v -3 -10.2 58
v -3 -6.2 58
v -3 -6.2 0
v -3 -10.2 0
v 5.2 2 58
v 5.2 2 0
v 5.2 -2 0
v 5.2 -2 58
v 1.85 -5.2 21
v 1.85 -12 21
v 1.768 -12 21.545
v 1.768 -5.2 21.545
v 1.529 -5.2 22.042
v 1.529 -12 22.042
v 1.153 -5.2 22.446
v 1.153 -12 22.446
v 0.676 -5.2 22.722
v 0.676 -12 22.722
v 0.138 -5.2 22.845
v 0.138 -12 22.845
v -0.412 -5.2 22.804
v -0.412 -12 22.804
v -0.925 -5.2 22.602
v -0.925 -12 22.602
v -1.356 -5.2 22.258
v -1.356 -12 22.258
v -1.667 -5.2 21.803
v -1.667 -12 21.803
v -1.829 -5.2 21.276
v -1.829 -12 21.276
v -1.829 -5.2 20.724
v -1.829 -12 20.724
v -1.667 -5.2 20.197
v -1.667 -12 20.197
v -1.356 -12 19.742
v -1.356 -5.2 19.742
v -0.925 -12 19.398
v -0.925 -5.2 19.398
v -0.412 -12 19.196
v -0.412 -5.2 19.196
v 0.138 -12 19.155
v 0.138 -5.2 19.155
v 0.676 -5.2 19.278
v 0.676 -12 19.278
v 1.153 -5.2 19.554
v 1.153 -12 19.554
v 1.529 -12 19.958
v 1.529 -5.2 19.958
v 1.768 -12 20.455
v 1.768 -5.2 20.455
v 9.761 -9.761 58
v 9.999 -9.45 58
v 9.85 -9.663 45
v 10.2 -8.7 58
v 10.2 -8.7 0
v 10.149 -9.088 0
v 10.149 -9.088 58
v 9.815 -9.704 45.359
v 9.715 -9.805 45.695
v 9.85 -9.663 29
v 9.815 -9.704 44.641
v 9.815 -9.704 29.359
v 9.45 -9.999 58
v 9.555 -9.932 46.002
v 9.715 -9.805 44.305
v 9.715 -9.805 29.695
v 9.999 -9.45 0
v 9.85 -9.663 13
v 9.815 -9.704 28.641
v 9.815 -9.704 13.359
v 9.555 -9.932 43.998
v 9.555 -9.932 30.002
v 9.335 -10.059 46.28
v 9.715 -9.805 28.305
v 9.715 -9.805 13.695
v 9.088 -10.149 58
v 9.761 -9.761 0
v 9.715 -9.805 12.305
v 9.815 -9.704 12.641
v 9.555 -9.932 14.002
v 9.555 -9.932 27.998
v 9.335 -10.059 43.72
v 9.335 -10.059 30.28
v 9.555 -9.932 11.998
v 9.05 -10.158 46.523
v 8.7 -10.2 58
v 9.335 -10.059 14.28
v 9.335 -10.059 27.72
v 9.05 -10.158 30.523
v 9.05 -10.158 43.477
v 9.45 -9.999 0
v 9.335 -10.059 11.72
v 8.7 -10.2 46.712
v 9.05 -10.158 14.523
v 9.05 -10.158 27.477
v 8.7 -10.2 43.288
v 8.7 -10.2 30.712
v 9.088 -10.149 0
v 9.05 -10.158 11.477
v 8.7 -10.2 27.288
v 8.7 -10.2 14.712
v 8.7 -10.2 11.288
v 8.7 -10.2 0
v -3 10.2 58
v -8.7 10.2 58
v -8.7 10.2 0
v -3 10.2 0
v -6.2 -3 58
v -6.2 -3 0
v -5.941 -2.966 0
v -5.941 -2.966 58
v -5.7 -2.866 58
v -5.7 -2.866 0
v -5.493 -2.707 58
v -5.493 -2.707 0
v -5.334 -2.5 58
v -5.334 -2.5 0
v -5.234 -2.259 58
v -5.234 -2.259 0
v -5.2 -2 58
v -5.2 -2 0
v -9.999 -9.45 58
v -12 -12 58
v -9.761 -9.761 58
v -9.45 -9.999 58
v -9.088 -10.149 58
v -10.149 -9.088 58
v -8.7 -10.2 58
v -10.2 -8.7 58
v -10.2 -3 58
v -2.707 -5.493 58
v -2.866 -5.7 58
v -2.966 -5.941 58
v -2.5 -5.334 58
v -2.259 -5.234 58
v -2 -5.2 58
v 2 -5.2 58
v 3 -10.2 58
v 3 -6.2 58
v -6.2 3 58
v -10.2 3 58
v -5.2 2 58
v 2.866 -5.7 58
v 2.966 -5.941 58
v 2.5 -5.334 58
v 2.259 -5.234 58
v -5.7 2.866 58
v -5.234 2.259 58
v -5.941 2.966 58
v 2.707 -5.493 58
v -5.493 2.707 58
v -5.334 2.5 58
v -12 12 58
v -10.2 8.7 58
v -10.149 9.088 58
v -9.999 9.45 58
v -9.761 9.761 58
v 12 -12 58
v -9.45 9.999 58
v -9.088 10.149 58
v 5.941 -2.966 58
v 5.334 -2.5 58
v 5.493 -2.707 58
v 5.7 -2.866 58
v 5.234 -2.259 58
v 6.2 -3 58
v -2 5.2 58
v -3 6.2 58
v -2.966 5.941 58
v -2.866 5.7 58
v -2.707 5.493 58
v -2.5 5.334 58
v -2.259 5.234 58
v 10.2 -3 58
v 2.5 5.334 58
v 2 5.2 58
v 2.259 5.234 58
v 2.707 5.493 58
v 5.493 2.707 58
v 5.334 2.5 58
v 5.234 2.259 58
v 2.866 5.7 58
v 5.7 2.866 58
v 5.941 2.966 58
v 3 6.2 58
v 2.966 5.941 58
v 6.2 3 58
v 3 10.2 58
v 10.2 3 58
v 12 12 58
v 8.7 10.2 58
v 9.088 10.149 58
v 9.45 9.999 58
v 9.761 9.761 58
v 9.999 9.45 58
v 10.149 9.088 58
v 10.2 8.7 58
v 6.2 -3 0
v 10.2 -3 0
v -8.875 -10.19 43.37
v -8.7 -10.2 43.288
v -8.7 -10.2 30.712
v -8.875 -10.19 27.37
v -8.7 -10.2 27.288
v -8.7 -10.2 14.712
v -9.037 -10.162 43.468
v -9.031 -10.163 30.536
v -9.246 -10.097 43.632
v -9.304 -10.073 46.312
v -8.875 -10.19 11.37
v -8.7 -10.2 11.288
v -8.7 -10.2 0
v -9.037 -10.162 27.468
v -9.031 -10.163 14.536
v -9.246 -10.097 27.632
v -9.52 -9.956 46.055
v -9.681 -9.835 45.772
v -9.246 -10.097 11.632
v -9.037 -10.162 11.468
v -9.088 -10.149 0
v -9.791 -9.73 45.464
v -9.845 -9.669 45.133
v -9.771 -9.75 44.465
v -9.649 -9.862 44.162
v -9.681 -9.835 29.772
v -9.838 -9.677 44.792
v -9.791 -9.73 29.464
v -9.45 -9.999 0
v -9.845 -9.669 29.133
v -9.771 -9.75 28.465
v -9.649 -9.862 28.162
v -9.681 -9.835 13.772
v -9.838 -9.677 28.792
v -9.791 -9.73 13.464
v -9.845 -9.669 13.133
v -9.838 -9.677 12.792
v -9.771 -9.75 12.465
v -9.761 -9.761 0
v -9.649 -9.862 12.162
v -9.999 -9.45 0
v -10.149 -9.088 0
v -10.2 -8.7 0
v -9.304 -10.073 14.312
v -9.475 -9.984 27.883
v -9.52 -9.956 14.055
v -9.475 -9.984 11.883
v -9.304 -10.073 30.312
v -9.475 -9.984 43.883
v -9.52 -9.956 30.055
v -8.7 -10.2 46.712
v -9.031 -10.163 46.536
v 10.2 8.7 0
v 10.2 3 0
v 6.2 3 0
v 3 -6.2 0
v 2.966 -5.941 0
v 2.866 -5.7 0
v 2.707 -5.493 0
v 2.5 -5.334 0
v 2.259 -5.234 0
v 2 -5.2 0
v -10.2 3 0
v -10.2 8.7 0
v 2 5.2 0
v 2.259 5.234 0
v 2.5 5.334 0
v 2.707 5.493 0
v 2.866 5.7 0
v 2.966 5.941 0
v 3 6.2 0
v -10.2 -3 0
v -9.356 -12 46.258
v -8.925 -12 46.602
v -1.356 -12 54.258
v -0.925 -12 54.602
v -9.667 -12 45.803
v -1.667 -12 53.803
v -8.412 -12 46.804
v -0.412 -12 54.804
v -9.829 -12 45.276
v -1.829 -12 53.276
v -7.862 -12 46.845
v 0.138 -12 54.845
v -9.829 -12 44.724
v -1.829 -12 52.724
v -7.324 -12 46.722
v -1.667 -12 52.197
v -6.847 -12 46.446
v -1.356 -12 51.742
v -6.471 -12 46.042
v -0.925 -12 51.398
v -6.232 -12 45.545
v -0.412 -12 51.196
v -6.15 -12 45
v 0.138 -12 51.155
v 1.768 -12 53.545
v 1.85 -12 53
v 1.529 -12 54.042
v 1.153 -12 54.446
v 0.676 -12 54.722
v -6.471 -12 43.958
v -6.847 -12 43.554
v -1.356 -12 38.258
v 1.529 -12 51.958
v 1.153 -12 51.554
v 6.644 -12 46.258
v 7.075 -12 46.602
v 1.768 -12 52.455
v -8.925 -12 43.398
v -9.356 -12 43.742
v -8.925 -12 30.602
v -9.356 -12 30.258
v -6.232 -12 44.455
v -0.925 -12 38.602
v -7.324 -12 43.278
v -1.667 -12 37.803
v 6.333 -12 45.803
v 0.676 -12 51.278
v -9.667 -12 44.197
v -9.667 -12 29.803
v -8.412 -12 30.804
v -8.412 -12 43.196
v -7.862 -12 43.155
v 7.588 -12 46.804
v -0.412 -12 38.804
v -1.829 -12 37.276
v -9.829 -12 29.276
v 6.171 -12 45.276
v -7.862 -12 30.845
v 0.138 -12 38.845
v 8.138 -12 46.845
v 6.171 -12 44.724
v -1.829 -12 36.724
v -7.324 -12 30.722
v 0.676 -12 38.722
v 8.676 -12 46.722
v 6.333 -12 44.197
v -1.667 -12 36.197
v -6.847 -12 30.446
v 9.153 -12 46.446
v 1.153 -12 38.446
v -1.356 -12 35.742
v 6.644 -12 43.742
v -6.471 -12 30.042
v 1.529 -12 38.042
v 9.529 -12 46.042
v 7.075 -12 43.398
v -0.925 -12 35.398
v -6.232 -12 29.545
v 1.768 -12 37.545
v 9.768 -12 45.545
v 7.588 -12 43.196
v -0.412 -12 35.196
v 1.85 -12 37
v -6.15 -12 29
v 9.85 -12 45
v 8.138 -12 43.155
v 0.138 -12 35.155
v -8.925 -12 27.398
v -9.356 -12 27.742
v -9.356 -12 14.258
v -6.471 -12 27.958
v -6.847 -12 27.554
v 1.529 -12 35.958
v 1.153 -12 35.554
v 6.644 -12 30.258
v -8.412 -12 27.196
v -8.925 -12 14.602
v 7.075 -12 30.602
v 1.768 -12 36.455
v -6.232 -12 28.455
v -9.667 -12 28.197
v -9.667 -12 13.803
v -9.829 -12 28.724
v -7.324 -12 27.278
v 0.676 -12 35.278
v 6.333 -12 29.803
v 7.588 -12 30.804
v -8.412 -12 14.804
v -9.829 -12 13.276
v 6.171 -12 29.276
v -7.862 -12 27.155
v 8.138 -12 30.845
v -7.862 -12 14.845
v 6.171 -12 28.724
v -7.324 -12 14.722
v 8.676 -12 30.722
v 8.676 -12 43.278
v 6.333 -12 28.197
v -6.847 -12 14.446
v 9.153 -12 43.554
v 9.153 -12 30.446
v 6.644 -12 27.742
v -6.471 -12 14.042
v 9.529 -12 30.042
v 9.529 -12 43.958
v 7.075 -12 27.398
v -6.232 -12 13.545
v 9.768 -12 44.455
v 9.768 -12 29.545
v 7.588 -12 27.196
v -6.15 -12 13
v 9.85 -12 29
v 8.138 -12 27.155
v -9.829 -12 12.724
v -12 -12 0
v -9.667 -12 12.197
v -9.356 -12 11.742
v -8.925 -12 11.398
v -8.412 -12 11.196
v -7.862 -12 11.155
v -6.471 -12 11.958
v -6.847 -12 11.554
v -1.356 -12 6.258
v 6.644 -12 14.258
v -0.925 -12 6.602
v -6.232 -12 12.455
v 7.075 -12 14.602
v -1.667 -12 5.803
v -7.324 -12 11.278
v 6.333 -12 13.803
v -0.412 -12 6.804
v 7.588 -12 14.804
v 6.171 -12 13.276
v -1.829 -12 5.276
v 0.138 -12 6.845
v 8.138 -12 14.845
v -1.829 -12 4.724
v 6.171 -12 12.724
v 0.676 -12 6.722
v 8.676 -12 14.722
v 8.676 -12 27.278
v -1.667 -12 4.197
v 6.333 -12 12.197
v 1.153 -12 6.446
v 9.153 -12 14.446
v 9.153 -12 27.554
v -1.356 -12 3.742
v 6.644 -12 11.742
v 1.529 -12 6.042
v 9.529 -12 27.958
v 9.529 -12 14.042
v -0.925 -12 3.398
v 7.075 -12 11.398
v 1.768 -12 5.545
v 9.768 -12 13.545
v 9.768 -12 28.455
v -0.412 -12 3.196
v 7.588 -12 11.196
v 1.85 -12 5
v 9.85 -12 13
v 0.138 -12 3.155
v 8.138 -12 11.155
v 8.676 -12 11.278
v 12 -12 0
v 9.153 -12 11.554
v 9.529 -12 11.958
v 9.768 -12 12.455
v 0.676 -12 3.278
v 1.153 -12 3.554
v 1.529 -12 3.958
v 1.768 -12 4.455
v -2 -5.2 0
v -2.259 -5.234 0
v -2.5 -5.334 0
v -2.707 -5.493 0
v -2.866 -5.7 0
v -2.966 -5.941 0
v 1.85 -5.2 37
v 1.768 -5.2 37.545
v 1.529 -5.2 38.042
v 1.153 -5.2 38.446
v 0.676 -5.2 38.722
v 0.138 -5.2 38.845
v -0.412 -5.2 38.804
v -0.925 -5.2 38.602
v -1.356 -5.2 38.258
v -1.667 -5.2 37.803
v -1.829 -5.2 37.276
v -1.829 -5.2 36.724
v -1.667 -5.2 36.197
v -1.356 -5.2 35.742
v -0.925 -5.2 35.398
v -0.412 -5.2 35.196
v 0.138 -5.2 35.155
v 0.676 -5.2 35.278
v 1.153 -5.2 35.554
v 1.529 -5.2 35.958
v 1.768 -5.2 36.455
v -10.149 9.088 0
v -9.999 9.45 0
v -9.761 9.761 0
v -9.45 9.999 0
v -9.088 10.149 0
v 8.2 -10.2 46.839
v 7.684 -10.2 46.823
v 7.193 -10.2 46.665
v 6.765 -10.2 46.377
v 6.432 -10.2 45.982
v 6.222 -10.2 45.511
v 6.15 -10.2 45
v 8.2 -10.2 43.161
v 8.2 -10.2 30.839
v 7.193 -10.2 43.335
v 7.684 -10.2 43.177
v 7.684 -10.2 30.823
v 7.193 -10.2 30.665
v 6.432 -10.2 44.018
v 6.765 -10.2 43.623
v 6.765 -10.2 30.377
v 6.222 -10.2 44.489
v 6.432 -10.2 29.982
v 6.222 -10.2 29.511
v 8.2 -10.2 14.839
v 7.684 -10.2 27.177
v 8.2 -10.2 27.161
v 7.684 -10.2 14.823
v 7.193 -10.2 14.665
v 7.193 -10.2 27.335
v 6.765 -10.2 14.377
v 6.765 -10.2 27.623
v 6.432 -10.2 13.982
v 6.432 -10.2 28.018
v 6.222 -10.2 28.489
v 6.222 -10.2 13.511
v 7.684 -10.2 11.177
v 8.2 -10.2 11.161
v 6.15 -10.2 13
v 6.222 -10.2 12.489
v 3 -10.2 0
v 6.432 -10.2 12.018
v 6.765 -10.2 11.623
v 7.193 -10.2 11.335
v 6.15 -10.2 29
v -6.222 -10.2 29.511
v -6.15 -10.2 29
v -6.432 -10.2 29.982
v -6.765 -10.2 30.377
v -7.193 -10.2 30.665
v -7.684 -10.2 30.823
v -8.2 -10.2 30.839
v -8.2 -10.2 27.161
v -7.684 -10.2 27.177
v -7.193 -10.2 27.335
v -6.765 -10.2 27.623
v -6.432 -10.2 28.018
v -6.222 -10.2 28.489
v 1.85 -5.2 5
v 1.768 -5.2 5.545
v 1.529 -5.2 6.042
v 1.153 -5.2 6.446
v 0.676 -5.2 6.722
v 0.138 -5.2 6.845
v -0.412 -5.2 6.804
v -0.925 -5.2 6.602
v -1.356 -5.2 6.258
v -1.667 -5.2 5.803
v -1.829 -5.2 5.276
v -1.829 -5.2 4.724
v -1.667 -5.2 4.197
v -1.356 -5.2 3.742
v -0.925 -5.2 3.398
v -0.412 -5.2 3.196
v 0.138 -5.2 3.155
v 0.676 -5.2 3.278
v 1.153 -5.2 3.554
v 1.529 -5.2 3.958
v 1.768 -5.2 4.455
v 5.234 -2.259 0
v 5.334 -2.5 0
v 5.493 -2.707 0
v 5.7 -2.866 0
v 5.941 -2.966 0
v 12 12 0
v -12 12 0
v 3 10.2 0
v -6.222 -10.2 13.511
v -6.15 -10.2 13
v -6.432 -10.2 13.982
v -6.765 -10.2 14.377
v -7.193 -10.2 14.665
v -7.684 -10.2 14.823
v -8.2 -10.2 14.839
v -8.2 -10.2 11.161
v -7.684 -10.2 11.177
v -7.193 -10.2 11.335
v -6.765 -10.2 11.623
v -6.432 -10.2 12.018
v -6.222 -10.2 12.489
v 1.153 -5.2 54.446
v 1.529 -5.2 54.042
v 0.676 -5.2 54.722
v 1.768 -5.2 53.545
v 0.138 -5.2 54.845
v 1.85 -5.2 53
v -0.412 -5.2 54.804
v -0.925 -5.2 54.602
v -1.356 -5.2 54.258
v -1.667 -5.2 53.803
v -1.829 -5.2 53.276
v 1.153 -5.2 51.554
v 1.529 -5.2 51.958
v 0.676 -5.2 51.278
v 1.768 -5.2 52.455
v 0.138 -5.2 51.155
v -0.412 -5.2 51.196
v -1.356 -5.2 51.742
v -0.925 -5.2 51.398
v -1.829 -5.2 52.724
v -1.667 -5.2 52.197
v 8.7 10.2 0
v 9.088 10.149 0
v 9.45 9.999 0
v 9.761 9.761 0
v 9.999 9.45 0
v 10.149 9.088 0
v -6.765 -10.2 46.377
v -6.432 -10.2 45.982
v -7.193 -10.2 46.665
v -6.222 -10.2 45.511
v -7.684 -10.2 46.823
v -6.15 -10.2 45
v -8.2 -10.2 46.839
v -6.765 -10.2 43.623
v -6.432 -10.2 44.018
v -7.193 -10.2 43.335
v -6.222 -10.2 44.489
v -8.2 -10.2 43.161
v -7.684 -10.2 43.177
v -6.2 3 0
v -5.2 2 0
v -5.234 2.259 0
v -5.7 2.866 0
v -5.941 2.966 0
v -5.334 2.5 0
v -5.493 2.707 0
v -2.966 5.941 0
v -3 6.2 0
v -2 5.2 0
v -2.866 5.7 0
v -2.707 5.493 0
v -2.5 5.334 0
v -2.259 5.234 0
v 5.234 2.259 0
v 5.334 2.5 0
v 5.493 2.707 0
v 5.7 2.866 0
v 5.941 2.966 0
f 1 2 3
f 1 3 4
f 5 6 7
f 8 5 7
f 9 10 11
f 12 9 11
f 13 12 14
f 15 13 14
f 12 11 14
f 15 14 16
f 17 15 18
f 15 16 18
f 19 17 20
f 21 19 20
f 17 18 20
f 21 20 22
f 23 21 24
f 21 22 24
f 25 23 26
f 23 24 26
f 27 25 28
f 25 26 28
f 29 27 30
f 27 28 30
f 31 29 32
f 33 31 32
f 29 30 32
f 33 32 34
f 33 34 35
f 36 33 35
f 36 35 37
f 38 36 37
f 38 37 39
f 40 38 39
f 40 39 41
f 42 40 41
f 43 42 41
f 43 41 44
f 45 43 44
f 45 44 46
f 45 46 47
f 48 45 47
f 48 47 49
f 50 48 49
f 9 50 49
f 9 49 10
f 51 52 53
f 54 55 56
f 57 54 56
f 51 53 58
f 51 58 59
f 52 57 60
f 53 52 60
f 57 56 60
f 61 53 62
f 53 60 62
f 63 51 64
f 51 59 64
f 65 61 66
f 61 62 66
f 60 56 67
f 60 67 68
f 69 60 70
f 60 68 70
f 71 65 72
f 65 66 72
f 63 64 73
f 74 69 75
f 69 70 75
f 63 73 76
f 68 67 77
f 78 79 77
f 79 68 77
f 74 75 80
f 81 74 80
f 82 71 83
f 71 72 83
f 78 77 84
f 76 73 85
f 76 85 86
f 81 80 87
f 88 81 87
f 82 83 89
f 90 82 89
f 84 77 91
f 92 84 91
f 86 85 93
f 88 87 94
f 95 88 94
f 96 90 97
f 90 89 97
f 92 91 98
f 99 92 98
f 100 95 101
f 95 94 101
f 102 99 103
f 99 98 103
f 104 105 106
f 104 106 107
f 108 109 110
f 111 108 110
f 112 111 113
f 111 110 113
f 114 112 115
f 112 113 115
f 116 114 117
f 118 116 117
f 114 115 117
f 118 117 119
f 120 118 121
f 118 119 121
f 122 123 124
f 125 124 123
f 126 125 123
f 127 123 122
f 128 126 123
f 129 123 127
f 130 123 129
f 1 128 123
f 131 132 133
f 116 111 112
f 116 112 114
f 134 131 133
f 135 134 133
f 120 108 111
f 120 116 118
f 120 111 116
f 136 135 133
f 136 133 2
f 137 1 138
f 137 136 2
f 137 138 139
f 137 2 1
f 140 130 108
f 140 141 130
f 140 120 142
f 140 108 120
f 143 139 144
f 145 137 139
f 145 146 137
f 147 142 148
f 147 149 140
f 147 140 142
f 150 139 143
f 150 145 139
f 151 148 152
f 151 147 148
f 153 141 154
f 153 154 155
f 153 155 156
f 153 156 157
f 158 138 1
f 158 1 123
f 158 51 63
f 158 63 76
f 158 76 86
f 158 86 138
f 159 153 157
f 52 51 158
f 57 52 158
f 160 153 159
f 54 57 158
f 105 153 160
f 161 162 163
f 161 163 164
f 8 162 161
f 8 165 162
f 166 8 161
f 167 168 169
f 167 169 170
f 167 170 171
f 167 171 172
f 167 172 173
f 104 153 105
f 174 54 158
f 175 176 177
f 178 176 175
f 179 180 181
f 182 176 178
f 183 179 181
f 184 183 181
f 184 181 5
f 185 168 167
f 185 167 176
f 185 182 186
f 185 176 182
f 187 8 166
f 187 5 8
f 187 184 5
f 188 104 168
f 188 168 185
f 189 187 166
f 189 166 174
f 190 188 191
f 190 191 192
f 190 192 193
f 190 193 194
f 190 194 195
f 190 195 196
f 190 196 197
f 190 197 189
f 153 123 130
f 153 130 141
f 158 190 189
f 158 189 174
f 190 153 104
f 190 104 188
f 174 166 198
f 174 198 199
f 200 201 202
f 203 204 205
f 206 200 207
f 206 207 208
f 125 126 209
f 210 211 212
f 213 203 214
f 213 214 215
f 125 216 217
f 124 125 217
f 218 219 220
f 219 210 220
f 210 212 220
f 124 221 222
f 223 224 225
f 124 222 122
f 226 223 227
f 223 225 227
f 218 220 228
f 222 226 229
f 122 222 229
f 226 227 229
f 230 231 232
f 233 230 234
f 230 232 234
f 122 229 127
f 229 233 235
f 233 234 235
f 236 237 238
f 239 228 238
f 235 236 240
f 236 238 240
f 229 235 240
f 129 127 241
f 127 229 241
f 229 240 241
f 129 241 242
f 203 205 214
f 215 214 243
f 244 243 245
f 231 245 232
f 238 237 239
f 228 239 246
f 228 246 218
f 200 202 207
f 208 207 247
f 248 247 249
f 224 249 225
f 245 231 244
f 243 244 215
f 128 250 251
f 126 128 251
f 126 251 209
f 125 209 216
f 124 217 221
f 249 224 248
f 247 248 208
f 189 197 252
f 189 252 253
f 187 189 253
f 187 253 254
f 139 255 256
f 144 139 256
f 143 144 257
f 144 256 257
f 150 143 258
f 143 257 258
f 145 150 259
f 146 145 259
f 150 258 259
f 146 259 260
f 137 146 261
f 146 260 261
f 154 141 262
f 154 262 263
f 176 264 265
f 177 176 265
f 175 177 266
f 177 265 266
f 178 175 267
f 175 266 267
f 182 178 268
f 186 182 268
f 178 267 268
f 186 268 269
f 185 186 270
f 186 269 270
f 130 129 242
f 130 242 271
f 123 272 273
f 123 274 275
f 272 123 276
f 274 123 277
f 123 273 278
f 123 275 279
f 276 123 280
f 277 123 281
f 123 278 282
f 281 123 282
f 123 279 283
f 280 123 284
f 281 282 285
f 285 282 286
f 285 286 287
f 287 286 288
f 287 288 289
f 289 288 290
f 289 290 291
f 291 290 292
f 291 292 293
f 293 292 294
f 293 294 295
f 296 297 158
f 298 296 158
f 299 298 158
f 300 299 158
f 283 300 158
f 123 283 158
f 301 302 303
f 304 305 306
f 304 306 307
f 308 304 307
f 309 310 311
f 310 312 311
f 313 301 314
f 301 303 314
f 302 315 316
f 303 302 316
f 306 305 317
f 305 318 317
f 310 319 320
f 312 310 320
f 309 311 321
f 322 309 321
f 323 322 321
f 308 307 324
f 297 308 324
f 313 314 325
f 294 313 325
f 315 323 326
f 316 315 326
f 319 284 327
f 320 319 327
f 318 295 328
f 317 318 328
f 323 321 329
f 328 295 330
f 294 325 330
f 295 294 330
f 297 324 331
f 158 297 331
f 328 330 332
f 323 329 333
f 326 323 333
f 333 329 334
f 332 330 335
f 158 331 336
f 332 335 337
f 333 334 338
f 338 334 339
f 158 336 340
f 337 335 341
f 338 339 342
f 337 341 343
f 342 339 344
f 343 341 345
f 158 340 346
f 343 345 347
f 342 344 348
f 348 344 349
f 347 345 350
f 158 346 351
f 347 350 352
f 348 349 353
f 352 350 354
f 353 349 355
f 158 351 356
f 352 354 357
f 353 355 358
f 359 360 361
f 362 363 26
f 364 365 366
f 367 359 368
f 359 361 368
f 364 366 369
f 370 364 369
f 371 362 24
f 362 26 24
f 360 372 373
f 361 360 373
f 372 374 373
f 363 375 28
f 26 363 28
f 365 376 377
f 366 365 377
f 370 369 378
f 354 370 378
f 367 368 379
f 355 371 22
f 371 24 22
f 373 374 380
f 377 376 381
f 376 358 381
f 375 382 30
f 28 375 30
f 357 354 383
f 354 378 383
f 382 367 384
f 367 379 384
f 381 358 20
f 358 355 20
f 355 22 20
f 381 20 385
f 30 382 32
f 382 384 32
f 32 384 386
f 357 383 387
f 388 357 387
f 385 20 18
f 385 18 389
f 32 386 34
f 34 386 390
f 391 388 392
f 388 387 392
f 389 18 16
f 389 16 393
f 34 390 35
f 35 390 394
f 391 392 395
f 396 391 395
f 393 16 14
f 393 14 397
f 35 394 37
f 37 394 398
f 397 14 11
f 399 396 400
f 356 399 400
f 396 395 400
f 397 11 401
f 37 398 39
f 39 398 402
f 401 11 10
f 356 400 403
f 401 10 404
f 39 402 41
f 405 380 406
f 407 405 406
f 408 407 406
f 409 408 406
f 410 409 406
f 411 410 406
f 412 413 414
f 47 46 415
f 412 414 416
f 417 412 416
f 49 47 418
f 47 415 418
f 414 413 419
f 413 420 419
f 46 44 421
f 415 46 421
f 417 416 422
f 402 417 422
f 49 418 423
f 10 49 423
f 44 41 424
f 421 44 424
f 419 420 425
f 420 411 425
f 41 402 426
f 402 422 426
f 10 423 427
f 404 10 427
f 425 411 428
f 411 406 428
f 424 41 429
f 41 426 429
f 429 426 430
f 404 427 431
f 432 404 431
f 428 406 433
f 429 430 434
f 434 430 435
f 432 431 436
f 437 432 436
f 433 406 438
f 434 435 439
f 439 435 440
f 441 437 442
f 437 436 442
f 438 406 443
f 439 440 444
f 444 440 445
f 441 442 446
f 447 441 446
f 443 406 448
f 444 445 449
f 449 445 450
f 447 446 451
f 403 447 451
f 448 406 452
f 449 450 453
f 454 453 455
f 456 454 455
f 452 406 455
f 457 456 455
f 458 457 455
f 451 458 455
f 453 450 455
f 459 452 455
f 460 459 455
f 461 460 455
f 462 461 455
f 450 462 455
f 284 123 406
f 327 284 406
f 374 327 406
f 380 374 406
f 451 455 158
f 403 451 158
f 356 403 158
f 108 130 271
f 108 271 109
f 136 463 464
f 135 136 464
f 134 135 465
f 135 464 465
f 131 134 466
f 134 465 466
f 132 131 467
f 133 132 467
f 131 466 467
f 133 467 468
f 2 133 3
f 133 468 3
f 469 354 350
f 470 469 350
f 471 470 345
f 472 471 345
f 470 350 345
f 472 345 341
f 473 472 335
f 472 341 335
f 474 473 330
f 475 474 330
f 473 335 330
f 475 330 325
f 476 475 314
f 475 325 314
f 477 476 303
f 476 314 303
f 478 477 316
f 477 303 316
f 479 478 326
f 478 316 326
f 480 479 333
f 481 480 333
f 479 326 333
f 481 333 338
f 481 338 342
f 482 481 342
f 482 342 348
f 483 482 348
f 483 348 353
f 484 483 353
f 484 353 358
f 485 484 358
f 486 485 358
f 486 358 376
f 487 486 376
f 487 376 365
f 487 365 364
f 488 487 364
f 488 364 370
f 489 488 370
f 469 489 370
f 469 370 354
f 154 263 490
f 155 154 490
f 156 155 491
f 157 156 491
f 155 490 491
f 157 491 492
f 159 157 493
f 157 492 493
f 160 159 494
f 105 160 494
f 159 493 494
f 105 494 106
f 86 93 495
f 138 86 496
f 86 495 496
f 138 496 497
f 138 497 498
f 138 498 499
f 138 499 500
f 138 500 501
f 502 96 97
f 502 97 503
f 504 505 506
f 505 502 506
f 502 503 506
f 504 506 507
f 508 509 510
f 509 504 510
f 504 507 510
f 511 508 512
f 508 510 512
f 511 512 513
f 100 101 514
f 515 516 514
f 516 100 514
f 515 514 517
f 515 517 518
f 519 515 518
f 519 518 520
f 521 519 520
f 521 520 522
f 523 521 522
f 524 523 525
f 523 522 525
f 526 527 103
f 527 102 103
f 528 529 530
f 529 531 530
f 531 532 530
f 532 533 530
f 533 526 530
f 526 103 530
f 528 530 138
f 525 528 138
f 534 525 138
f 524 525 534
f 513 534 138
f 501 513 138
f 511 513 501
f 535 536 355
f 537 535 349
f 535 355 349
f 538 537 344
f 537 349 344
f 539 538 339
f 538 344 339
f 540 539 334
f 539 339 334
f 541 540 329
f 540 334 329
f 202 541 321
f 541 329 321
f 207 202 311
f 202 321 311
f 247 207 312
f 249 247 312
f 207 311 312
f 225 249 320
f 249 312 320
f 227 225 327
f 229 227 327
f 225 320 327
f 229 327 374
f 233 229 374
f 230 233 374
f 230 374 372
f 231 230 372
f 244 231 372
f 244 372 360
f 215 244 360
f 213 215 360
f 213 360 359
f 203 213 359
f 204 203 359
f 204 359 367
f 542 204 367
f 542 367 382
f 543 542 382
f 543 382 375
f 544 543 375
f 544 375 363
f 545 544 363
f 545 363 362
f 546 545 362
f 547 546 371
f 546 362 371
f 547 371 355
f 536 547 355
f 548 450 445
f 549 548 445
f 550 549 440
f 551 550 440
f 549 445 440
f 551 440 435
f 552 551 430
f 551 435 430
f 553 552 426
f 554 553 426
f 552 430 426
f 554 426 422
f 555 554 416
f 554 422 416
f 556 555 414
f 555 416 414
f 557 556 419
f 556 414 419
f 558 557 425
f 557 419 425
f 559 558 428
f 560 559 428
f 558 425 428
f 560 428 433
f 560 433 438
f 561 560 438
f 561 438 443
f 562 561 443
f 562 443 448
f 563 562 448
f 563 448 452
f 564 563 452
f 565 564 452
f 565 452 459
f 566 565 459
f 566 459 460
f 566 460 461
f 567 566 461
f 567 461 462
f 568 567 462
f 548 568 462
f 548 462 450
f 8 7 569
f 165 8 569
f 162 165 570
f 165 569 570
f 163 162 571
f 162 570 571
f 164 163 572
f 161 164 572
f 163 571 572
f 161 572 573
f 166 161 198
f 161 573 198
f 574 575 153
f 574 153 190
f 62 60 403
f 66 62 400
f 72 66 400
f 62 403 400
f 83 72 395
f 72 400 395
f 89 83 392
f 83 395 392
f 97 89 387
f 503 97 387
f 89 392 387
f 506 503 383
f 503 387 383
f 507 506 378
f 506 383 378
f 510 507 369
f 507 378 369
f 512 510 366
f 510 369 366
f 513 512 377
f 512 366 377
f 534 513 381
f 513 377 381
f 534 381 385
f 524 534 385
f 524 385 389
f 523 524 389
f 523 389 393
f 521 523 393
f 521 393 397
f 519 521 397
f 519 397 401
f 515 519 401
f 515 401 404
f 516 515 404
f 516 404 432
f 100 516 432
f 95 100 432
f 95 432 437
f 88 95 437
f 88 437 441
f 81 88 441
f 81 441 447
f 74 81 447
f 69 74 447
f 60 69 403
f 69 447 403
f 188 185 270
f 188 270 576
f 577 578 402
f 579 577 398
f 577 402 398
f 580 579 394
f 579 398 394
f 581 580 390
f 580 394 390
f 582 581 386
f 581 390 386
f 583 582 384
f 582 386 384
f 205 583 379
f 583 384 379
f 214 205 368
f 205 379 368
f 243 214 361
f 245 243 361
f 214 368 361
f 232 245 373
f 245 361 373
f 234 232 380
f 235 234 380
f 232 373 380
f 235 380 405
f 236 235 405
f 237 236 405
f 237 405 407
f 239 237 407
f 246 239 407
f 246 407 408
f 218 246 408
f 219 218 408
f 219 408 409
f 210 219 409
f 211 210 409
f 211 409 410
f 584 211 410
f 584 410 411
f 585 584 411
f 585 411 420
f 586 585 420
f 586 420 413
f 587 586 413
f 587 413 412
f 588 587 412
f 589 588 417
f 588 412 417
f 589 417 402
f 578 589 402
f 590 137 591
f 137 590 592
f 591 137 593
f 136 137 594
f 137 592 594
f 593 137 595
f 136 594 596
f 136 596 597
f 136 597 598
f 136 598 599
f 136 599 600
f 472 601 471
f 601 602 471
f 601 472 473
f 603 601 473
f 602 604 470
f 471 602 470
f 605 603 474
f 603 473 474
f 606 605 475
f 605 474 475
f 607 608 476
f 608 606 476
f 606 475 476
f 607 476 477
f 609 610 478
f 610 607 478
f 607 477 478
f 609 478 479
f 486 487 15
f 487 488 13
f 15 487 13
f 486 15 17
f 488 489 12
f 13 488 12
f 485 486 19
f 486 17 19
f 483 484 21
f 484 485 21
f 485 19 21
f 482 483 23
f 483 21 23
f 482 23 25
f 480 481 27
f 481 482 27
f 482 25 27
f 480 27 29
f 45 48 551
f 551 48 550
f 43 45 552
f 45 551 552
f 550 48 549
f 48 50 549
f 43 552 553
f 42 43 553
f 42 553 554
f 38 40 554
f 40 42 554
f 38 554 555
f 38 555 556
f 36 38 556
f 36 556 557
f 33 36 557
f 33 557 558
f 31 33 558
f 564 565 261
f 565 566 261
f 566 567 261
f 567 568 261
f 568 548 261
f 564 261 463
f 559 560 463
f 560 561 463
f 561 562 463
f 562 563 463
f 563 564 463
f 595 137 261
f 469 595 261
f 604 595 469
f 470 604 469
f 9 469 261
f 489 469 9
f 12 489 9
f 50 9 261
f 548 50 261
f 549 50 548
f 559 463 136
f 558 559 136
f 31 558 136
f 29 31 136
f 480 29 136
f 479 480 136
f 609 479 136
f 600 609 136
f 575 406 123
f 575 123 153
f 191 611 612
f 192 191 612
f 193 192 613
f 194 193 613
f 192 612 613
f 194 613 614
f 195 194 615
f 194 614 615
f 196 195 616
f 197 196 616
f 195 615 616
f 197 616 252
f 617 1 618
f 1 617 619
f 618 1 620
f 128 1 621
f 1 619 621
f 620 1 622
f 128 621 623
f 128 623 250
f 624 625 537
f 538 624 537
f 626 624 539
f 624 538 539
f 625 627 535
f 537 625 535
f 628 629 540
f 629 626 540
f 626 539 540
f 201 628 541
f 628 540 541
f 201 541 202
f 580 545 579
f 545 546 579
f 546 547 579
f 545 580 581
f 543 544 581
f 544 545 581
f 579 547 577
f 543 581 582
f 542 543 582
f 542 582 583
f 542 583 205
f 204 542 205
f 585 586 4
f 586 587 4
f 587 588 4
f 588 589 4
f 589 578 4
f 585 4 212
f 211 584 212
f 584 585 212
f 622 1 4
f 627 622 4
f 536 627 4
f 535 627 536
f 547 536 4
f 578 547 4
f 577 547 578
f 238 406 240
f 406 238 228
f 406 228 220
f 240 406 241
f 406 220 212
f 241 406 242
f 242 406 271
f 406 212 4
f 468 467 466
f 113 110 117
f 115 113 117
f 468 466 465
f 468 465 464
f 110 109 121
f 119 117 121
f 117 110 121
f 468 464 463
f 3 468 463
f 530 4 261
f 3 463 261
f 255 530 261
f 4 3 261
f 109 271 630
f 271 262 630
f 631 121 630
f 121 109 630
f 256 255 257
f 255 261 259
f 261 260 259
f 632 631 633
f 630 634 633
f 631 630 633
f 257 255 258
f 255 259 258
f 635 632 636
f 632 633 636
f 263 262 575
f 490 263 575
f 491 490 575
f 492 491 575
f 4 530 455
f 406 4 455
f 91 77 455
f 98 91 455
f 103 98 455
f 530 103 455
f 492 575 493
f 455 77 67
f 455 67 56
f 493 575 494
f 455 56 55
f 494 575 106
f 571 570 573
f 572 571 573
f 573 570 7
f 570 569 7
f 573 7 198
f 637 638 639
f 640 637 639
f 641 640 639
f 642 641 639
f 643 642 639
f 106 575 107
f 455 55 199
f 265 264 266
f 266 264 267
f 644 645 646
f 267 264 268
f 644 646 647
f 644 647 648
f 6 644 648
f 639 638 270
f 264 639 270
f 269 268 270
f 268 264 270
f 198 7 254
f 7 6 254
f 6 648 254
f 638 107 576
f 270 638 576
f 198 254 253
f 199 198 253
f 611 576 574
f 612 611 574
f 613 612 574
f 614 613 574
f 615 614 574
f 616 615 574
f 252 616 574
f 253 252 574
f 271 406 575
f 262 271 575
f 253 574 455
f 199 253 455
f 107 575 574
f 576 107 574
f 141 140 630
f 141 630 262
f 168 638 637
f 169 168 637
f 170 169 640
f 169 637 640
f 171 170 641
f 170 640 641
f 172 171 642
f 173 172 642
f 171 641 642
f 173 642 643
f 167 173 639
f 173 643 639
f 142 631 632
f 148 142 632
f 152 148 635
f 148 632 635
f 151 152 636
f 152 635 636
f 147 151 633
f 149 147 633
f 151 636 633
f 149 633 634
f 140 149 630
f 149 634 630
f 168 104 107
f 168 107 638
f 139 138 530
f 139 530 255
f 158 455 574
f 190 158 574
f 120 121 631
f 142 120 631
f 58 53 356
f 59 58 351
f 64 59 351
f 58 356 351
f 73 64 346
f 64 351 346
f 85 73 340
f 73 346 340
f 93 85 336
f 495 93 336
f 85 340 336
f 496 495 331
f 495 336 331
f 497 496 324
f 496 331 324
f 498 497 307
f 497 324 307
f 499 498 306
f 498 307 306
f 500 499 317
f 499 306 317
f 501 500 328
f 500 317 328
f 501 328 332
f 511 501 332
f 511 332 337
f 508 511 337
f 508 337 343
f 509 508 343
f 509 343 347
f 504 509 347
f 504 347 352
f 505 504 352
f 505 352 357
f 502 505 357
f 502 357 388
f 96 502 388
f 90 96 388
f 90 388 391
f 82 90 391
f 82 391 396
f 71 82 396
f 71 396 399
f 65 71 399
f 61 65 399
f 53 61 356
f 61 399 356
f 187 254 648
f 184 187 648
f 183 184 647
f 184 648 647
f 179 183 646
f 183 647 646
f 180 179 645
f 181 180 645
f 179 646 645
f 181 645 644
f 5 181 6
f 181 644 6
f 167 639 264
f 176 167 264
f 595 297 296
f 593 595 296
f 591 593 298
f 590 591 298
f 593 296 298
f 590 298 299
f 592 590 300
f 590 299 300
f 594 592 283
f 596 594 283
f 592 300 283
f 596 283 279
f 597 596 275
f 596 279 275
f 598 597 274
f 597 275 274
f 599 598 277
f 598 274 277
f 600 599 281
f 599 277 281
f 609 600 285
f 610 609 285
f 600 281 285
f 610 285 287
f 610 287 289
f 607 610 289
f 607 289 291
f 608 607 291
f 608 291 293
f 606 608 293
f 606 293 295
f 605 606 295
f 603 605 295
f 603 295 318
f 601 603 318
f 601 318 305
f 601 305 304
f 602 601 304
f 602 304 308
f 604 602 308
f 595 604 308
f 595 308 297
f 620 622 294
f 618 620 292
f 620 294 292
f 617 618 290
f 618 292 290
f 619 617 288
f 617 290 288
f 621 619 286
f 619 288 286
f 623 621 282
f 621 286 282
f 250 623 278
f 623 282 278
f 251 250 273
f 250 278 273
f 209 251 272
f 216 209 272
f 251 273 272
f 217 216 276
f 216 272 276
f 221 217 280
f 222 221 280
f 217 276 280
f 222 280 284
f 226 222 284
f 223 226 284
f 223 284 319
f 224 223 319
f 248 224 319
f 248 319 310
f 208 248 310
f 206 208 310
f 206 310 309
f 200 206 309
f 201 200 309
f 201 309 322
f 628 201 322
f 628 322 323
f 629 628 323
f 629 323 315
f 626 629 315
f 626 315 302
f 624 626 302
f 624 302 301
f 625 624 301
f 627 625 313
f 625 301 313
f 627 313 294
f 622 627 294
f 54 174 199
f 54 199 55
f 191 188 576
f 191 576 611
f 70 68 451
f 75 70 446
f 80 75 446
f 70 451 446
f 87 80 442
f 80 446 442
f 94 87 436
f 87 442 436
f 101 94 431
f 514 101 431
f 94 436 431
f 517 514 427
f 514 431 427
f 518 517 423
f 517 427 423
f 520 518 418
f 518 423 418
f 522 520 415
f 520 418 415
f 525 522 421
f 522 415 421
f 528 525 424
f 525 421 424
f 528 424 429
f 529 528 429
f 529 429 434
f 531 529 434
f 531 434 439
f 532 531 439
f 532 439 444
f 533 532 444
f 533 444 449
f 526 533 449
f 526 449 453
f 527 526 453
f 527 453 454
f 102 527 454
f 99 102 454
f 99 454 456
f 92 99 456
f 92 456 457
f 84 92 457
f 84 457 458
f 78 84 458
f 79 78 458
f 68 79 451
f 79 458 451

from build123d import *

# Parameters (mm, degrees)
F0_W     = 24
F0_H     = 24
F1_DEPTH = 58
F2_R     = 1.85
F3_DEPTH = 7.5


with BuildPart() as f1:
    # F0 (on Top) → F1 (new body)
    with BuildSketch(Plane.XY):
        Rectangle(F0_W, F0_H)
        with BuildLine():
            ThreePointArc((-8.7, -10.2), (-9.76066, -9.76066), (-10.2, -8.7))
            Line((-10.2, -8.7), (-10.2, -3))
            Line((-10.2, -3), (-6.2, -3))
            ThreePointArc((-6.2, -3), (-5.492893, -2.707107), (-5.2, -2))
            Line((-5.2, -2), (-5.2, 2))
            ThreePointArc((-5.2, 2), (-5.492893, 2.707107), (-6.2, 3))
            Line((-6.2, 3), (-10.2, 3))
            Line((-10.2, 3), (-10.2, 8.7))
            ThreePointArc((-10.2, 8.7), (-9.76066, 9.76066), (-8.7, 10.2))
            Line((-8.7, 10.2), (-3, 10.2))
            Line((-3, 10.2), (-3, 6.2))
            ThreePointArc((-3, 6.2), (-2.707107, 5.492893), (-2, 5.2))
            Line((-2, 5.2), (2, 5.2))
            ThreePointArc((2, 5.2), (2.707107, 5.492893), (3, 6.2))
            Line((3, 6.2), (3, 10.2))
            Line((3, 10.2), (8.7, 10.2))
            ThreePointArc((8.7, 10.2), (9.76066, 9.76066), (10.2, 8.7))
            Line((10.2, 8.7), (10.2, 3))
            Line((10.2, 3), (6.2, 3))
            ThreePointArc((6.2, 3), (5.492893, 2.707107), (5.2, 2))
            Line((5.2, 2), (5.2, -2))
            ThreePointArc((5.2, -2), (5.492893, -2.707107), (6.2, -3))
            Line((6.2, -3), (10.2, -3))
            Line((10.2, -3), (10.2, -8.7))
            ThreePointArc((10.2, -8.7), (9.76066, -9.76066), (8.7, -10.2))
            Line((8.7, -10.2), (3, -10.2))
            Line((3, -10.2), (3, -6.2))
            ThreePointArc((3, -6.2), (2.707107, -5.492893), (2, -5.2))
            Line((2, -5.2), (-2, -5.2))
            ThreePointArc((-2, -5.2), (-2.707107, -5.492893), (-3, -6.2))
            Line((-3, -6.2), (-3, -10.2))
            Line((-3, -10.2), (-8.7, -10.2))
        make_face(mode=Mode.SUBTRACT)
    extrude(amount=F1_DEPTH)

    # F2 (on face) → F3 (cut)
    with BuildSketch(Plane.XZ.offset(12)):
        with Locations((0, 53)):
            Circle(F2_R)
        with Locations((8, 45)):
            Circle(F2_R)
        with Locations((-8, 45)):
            Circle(F2_R)
        with Locations((0, 37)):
            Circle(F2_R)
        with Locations((-8, 29)):
            Circle(F2_R)
        with Locations((0, 21)):
            Circle(F2_R)
        with Locations((8, 29)):
            Circle(F2_R)
        with Locations((8, 13)):
            Circle(F2_R)
        with Locations((-8, 13)):
            Circle(F2_R)
        with Locations((0, 5)):
            Circle(F2_R)
    extrude(amount=-F3_DEPTH, mode=Mode.SUBTRACT)


solid = f1.part
